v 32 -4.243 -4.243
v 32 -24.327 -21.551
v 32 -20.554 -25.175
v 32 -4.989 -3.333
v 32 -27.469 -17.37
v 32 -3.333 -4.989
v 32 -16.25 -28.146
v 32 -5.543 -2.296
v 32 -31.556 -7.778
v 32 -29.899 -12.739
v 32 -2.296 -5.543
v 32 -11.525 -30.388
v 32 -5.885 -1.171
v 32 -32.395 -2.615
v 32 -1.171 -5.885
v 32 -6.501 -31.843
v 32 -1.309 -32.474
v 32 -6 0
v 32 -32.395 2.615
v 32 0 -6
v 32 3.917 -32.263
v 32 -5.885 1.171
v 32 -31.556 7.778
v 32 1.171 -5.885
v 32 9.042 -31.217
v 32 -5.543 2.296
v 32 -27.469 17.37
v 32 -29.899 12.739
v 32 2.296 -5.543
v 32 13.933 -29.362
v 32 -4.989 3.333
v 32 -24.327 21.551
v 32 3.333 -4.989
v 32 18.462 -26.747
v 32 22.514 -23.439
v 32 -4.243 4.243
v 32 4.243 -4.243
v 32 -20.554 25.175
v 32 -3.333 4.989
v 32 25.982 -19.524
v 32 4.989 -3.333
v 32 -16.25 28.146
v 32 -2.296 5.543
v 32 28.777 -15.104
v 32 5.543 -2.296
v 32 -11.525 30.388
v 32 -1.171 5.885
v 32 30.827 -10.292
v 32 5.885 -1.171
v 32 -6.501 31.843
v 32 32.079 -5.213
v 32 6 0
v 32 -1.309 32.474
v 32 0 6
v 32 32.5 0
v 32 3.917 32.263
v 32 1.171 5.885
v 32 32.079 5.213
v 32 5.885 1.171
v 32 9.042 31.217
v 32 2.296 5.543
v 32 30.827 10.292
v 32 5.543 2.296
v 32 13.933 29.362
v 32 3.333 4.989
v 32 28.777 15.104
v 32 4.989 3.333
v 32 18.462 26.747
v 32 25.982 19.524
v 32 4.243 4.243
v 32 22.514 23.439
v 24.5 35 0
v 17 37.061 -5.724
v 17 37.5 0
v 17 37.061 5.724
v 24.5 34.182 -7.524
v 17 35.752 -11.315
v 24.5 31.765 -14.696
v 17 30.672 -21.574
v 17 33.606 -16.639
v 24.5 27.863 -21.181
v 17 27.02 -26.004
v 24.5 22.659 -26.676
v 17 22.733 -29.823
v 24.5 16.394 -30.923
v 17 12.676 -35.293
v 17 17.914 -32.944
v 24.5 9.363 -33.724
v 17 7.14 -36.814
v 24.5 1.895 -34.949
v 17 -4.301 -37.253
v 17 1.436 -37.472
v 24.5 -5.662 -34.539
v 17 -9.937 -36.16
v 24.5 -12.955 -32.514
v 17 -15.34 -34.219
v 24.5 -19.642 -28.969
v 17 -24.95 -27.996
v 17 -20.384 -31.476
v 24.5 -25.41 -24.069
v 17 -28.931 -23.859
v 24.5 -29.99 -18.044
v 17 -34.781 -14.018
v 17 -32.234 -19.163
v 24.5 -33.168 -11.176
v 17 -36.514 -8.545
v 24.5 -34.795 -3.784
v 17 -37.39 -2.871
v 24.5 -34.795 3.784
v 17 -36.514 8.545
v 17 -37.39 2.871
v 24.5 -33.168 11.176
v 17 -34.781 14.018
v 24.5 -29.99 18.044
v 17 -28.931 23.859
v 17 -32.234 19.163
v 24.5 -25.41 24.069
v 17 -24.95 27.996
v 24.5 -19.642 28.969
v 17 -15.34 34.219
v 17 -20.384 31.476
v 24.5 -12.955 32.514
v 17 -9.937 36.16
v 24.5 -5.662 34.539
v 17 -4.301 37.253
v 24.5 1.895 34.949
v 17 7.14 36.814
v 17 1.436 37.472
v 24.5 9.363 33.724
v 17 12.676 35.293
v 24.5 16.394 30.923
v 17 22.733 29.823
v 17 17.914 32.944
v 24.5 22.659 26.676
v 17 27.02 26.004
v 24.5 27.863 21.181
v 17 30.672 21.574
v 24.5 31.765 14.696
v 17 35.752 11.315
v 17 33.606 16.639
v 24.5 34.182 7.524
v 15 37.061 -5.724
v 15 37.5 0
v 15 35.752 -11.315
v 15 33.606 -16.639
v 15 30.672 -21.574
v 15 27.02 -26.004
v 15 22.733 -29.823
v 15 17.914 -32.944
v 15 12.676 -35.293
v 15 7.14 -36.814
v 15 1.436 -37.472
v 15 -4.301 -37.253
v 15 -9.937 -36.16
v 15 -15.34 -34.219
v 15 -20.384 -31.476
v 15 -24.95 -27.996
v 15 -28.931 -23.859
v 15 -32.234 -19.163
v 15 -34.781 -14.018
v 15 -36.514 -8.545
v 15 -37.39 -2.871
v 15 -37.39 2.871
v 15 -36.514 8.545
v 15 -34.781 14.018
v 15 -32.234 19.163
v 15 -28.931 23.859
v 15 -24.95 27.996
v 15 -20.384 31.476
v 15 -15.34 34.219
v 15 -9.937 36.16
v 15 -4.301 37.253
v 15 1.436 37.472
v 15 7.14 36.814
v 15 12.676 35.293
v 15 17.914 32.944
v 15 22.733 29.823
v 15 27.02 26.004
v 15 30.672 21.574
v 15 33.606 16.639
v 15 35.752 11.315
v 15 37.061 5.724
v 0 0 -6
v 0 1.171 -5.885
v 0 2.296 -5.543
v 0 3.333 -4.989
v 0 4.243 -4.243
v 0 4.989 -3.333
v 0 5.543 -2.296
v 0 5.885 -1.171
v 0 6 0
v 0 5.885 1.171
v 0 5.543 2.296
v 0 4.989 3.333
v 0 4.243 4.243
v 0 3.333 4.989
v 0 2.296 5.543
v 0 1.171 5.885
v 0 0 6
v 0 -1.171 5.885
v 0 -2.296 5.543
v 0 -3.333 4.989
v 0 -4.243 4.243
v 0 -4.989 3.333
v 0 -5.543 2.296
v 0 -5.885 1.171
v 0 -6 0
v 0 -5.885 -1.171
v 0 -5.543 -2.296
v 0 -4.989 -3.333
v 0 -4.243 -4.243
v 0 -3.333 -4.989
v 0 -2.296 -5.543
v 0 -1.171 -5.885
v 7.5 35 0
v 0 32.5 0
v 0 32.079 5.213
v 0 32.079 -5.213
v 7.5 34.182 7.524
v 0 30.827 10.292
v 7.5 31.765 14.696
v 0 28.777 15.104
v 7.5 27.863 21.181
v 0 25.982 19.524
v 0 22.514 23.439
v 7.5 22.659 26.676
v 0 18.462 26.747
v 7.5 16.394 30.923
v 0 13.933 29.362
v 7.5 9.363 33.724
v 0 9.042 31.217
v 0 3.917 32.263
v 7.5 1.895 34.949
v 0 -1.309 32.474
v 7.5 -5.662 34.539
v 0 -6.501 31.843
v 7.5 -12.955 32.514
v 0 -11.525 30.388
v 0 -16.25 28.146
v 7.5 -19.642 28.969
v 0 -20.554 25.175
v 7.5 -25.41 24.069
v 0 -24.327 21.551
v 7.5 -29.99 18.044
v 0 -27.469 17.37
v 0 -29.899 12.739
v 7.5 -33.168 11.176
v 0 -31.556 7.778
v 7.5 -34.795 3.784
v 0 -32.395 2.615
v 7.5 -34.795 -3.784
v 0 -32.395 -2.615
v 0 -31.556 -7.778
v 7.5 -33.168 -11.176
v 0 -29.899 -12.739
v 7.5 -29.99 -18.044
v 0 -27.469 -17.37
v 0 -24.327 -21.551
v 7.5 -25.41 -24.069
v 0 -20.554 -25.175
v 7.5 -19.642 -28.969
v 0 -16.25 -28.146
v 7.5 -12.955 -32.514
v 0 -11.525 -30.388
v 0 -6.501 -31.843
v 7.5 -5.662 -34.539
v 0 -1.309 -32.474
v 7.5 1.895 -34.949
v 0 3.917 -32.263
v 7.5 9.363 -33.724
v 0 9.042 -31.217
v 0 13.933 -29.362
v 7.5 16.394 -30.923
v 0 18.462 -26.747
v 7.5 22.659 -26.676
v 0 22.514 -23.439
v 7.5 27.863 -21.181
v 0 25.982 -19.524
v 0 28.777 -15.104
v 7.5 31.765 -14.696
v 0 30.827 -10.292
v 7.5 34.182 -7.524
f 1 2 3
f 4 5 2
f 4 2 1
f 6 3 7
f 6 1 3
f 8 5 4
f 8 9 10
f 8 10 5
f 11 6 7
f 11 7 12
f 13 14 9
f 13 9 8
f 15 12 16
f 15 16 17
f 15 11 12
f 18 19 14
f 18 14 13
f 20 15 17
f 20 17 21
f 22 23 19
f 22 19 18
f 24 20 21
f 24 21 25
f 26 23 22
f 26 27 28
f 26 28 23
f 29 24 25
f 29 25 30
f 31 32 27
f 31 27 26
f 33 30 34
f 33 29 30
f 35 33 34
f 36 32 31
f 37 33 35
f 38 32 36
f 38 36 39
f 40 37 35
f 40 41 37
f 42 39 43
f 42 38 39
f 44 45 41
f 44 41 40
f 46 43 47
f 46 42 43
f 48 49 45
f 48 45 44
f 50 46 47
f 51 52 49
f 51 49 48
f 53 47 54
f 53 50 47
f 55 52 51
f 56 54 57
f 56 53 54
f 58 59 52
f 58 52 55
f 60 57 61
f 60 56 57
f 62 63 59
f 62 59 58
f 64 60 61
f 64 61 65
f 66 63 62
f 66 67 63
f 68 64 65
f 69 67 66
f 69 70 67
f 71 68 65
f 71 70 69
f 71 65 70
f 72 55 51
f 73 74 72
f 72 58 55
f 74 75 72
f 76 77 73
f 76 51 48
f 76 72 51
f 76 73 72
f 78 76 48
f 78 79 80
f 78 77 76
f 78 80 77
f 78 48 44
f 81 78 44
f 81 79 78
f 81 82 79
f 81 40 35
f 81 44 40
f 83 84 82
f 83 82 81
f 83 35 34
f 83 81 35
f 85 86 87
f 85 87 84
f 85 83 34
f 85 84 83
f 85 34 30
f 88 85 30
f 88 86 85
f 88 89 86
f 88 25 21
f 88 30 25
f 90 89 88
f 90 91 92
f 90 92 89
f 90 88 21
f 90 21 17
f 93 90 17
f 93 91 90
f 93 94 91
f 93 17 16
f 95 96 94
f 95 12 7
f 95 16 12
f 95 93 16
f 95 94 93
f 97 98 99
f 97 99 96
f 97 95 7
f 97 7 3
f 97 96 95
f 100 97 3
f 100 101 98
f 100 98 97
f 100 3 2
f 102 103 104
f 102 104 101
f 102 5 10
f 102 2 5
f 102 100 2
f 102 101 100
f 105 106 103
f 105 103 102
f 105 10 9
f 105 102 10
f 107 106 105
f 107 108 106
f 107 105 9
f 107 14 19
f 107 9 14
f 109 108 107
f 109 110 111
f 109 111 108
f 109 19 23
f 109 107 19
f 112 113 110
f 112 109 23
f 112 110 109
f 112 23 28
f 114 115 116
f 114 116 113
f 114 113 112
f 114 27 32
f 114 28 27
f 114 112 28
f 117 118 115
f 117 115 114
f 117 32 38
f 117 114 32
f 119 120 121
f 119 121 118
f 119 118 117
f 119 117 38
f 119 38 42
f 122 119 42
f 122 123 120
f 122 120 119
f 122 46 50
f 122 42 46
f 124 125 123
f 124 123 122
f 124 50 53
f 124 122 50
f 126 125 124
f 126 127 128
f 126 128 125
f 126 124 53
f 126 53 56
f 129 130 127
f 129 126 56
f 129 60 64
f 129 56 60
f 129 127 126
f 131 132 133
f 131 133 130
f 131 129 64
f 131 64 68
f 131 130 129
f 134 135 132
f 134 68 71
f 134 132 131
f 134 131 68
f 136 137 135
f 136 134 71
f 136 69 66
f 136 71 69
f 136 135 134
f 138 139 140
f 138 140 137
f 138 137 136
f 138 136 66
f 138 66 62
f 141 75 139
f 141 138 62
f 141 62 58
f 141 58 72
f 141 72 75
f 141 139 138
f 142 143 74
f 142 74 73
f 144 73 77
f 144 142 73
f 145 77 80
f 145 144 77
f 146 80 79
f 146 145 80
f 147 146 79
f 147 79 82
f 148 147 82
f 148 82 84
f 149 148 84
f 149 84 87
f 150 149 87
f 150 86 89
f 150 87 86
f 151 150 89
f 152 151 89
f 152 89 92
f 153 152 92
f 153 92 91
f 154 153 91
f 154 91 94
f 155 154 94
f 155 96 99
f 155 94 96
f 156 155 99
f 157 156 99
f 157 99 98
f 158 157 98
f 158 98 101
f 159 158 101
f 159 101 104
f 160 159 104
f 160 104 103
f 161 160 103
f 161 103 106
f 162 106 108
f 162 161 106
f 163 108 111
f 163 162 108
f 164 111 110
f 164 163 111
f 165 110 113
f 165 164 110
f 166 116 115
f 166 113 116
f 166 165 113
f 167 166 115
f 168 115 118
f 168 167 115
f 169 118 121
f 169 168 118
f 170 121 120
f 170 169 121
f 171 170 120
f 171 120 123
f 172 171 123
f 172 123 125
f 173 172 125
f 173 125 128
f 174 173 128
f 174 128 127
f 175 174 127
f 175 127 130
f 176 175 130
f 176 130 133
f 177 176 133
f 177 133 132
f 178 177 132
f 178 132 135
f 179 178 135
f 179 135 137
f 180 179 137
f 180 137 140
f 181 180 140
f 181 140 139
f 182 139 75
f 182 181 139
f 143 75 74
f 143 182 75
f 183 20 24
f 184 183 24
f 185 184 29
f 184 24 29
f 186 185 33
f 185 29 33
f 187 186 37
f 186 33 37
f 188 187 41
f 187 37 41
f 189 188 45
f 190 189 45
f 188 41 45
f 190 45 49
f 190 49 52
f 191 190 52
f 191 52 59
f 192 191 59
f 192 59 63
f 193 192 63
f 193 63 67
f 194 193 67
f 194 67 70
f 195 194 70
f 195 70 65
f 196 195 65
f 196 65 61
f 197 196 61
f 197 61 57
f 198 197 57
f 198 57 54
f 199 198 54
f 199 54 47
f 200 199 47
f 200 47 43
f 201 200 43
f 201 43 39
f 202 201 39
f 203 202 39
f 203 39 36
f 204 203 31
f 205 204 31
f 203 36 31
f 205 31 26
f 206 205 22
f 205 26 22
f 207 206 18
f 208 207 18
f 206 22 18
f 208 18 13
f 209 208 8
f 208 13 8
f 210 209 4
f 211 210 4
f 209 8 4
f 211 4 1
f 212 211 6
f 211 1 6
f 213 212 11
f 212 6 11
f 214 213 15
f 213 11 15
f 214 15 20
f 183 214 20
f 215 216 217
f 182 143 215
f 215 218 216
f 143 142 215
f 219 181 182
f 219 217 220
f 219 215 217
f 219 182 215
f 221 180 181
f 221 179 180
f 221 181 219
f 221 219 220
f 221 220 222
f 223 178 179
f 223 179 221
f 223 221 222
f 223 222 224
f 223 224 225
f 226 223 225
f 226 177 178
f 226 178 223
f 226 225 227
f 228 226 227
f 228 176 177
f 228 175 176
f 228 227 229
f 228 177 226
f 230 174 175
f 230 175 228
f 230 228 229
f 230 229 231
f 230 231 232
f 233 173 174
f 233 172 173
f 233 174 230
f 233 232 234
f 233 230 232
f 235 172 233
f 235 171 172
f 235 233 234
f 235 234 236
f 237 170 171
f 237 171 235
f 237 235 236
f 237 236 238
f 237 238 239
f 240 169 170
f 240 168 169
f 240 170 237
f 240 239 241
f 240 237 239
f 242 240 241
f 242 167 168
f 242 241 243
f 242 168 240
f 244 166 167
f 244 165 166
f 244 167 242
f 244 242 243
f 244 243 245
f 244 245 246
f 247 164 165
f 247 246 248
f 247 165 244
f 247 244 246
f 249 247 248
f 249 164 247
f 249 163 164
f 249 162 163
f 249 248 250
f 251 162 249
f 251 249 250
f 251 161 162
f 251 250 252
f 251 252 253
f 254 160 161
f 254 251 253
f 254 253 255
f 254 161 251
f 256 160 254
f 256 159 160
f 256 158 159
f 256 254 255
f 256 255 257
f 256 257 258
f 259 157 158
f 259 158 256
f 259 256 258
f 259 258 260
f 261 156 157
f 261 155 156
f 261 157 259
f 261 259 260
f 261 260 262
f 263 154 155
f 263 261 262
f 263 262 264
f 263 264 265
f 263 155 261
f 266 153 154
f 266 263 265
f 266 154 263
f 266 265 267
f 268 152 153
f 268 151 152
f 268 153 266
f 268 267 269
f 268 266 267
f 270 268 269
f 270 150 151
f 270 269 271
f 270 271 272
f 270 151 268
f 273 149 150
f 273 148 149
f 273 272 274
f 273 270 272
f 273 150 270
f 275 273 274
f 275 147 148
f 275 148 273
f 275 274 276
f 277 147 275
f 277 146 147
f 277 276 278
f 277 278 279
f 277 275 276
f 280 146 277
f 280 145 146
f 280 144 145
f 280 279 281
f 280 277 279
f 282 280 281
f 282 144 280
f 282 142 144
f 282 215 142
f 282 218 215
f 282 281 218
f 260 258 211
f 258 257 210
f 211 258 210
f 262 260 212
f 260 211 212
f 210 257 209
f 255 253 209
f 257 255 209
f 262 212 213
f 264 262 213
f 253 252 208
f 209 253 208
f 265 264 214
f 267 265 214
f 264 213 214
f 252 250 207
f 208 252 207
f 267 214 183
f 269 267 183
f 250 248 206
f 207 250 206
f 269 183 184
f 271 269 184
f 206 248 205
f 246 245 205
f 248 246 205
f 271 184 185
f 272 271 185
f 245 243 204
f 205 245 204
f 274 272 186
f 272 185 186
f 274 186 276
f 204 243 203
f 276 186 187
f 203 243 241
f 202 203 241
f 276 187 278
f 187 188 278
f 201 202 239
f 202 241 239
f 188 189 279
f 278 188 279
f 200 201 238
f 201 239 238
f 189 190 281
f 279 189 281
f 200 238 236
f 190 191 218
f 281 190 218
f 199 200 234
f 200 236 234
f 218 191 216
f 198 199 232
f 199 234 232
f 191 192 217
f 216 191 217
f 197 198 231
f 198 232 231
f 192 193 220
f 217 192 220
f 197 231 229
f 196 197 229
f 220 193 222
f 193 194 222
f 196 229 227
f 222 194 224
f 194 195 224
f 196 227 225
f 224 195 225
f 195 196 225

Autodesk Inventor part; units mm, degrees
ref_plane "YZ Plane" through (0, 0, 0) normal (1, 0, 0) x (0, 1, 0)
ref_plane "XZ Plane" through (0, 0, 0) normal (0, 1, 0) x (-1, 0, 0)
ref_plane "XY Plane" through (0, 0, 0) normal (0, 0, 1) x (1, 0, 0)
sketch "스케치1" plane through (0, 0, 0) normal (1, 0, 0) x (0, 1, 0)
  circle A0 centre (0, 0) radius 37.5
  dimension "d0" = 75
extrude "돌출1" add sketch "스케치1" along normal blind 32
chamfer "모따기1" distance 5 distance2 15 1 edges at (32, -37.5, 0) measured on face at (32, 9.7729, -7.7936)
chamfer "모따기2" distance 5 distance2 15 1 edges at (0, -37.5, 0) measured on face at (0, 9.7729, -7.7936)
sketch "스케치2" plane through (32, 0, 0) normal (1, 0, 0) x (0, 0, -1)
  circle A0 centre (0, 0) radius 6
  dimension "d9" = 12
extrude "돌출2" cut sketch "스케치2" against normal blind 32
properties part number "Part_Rubber" material "고무"
